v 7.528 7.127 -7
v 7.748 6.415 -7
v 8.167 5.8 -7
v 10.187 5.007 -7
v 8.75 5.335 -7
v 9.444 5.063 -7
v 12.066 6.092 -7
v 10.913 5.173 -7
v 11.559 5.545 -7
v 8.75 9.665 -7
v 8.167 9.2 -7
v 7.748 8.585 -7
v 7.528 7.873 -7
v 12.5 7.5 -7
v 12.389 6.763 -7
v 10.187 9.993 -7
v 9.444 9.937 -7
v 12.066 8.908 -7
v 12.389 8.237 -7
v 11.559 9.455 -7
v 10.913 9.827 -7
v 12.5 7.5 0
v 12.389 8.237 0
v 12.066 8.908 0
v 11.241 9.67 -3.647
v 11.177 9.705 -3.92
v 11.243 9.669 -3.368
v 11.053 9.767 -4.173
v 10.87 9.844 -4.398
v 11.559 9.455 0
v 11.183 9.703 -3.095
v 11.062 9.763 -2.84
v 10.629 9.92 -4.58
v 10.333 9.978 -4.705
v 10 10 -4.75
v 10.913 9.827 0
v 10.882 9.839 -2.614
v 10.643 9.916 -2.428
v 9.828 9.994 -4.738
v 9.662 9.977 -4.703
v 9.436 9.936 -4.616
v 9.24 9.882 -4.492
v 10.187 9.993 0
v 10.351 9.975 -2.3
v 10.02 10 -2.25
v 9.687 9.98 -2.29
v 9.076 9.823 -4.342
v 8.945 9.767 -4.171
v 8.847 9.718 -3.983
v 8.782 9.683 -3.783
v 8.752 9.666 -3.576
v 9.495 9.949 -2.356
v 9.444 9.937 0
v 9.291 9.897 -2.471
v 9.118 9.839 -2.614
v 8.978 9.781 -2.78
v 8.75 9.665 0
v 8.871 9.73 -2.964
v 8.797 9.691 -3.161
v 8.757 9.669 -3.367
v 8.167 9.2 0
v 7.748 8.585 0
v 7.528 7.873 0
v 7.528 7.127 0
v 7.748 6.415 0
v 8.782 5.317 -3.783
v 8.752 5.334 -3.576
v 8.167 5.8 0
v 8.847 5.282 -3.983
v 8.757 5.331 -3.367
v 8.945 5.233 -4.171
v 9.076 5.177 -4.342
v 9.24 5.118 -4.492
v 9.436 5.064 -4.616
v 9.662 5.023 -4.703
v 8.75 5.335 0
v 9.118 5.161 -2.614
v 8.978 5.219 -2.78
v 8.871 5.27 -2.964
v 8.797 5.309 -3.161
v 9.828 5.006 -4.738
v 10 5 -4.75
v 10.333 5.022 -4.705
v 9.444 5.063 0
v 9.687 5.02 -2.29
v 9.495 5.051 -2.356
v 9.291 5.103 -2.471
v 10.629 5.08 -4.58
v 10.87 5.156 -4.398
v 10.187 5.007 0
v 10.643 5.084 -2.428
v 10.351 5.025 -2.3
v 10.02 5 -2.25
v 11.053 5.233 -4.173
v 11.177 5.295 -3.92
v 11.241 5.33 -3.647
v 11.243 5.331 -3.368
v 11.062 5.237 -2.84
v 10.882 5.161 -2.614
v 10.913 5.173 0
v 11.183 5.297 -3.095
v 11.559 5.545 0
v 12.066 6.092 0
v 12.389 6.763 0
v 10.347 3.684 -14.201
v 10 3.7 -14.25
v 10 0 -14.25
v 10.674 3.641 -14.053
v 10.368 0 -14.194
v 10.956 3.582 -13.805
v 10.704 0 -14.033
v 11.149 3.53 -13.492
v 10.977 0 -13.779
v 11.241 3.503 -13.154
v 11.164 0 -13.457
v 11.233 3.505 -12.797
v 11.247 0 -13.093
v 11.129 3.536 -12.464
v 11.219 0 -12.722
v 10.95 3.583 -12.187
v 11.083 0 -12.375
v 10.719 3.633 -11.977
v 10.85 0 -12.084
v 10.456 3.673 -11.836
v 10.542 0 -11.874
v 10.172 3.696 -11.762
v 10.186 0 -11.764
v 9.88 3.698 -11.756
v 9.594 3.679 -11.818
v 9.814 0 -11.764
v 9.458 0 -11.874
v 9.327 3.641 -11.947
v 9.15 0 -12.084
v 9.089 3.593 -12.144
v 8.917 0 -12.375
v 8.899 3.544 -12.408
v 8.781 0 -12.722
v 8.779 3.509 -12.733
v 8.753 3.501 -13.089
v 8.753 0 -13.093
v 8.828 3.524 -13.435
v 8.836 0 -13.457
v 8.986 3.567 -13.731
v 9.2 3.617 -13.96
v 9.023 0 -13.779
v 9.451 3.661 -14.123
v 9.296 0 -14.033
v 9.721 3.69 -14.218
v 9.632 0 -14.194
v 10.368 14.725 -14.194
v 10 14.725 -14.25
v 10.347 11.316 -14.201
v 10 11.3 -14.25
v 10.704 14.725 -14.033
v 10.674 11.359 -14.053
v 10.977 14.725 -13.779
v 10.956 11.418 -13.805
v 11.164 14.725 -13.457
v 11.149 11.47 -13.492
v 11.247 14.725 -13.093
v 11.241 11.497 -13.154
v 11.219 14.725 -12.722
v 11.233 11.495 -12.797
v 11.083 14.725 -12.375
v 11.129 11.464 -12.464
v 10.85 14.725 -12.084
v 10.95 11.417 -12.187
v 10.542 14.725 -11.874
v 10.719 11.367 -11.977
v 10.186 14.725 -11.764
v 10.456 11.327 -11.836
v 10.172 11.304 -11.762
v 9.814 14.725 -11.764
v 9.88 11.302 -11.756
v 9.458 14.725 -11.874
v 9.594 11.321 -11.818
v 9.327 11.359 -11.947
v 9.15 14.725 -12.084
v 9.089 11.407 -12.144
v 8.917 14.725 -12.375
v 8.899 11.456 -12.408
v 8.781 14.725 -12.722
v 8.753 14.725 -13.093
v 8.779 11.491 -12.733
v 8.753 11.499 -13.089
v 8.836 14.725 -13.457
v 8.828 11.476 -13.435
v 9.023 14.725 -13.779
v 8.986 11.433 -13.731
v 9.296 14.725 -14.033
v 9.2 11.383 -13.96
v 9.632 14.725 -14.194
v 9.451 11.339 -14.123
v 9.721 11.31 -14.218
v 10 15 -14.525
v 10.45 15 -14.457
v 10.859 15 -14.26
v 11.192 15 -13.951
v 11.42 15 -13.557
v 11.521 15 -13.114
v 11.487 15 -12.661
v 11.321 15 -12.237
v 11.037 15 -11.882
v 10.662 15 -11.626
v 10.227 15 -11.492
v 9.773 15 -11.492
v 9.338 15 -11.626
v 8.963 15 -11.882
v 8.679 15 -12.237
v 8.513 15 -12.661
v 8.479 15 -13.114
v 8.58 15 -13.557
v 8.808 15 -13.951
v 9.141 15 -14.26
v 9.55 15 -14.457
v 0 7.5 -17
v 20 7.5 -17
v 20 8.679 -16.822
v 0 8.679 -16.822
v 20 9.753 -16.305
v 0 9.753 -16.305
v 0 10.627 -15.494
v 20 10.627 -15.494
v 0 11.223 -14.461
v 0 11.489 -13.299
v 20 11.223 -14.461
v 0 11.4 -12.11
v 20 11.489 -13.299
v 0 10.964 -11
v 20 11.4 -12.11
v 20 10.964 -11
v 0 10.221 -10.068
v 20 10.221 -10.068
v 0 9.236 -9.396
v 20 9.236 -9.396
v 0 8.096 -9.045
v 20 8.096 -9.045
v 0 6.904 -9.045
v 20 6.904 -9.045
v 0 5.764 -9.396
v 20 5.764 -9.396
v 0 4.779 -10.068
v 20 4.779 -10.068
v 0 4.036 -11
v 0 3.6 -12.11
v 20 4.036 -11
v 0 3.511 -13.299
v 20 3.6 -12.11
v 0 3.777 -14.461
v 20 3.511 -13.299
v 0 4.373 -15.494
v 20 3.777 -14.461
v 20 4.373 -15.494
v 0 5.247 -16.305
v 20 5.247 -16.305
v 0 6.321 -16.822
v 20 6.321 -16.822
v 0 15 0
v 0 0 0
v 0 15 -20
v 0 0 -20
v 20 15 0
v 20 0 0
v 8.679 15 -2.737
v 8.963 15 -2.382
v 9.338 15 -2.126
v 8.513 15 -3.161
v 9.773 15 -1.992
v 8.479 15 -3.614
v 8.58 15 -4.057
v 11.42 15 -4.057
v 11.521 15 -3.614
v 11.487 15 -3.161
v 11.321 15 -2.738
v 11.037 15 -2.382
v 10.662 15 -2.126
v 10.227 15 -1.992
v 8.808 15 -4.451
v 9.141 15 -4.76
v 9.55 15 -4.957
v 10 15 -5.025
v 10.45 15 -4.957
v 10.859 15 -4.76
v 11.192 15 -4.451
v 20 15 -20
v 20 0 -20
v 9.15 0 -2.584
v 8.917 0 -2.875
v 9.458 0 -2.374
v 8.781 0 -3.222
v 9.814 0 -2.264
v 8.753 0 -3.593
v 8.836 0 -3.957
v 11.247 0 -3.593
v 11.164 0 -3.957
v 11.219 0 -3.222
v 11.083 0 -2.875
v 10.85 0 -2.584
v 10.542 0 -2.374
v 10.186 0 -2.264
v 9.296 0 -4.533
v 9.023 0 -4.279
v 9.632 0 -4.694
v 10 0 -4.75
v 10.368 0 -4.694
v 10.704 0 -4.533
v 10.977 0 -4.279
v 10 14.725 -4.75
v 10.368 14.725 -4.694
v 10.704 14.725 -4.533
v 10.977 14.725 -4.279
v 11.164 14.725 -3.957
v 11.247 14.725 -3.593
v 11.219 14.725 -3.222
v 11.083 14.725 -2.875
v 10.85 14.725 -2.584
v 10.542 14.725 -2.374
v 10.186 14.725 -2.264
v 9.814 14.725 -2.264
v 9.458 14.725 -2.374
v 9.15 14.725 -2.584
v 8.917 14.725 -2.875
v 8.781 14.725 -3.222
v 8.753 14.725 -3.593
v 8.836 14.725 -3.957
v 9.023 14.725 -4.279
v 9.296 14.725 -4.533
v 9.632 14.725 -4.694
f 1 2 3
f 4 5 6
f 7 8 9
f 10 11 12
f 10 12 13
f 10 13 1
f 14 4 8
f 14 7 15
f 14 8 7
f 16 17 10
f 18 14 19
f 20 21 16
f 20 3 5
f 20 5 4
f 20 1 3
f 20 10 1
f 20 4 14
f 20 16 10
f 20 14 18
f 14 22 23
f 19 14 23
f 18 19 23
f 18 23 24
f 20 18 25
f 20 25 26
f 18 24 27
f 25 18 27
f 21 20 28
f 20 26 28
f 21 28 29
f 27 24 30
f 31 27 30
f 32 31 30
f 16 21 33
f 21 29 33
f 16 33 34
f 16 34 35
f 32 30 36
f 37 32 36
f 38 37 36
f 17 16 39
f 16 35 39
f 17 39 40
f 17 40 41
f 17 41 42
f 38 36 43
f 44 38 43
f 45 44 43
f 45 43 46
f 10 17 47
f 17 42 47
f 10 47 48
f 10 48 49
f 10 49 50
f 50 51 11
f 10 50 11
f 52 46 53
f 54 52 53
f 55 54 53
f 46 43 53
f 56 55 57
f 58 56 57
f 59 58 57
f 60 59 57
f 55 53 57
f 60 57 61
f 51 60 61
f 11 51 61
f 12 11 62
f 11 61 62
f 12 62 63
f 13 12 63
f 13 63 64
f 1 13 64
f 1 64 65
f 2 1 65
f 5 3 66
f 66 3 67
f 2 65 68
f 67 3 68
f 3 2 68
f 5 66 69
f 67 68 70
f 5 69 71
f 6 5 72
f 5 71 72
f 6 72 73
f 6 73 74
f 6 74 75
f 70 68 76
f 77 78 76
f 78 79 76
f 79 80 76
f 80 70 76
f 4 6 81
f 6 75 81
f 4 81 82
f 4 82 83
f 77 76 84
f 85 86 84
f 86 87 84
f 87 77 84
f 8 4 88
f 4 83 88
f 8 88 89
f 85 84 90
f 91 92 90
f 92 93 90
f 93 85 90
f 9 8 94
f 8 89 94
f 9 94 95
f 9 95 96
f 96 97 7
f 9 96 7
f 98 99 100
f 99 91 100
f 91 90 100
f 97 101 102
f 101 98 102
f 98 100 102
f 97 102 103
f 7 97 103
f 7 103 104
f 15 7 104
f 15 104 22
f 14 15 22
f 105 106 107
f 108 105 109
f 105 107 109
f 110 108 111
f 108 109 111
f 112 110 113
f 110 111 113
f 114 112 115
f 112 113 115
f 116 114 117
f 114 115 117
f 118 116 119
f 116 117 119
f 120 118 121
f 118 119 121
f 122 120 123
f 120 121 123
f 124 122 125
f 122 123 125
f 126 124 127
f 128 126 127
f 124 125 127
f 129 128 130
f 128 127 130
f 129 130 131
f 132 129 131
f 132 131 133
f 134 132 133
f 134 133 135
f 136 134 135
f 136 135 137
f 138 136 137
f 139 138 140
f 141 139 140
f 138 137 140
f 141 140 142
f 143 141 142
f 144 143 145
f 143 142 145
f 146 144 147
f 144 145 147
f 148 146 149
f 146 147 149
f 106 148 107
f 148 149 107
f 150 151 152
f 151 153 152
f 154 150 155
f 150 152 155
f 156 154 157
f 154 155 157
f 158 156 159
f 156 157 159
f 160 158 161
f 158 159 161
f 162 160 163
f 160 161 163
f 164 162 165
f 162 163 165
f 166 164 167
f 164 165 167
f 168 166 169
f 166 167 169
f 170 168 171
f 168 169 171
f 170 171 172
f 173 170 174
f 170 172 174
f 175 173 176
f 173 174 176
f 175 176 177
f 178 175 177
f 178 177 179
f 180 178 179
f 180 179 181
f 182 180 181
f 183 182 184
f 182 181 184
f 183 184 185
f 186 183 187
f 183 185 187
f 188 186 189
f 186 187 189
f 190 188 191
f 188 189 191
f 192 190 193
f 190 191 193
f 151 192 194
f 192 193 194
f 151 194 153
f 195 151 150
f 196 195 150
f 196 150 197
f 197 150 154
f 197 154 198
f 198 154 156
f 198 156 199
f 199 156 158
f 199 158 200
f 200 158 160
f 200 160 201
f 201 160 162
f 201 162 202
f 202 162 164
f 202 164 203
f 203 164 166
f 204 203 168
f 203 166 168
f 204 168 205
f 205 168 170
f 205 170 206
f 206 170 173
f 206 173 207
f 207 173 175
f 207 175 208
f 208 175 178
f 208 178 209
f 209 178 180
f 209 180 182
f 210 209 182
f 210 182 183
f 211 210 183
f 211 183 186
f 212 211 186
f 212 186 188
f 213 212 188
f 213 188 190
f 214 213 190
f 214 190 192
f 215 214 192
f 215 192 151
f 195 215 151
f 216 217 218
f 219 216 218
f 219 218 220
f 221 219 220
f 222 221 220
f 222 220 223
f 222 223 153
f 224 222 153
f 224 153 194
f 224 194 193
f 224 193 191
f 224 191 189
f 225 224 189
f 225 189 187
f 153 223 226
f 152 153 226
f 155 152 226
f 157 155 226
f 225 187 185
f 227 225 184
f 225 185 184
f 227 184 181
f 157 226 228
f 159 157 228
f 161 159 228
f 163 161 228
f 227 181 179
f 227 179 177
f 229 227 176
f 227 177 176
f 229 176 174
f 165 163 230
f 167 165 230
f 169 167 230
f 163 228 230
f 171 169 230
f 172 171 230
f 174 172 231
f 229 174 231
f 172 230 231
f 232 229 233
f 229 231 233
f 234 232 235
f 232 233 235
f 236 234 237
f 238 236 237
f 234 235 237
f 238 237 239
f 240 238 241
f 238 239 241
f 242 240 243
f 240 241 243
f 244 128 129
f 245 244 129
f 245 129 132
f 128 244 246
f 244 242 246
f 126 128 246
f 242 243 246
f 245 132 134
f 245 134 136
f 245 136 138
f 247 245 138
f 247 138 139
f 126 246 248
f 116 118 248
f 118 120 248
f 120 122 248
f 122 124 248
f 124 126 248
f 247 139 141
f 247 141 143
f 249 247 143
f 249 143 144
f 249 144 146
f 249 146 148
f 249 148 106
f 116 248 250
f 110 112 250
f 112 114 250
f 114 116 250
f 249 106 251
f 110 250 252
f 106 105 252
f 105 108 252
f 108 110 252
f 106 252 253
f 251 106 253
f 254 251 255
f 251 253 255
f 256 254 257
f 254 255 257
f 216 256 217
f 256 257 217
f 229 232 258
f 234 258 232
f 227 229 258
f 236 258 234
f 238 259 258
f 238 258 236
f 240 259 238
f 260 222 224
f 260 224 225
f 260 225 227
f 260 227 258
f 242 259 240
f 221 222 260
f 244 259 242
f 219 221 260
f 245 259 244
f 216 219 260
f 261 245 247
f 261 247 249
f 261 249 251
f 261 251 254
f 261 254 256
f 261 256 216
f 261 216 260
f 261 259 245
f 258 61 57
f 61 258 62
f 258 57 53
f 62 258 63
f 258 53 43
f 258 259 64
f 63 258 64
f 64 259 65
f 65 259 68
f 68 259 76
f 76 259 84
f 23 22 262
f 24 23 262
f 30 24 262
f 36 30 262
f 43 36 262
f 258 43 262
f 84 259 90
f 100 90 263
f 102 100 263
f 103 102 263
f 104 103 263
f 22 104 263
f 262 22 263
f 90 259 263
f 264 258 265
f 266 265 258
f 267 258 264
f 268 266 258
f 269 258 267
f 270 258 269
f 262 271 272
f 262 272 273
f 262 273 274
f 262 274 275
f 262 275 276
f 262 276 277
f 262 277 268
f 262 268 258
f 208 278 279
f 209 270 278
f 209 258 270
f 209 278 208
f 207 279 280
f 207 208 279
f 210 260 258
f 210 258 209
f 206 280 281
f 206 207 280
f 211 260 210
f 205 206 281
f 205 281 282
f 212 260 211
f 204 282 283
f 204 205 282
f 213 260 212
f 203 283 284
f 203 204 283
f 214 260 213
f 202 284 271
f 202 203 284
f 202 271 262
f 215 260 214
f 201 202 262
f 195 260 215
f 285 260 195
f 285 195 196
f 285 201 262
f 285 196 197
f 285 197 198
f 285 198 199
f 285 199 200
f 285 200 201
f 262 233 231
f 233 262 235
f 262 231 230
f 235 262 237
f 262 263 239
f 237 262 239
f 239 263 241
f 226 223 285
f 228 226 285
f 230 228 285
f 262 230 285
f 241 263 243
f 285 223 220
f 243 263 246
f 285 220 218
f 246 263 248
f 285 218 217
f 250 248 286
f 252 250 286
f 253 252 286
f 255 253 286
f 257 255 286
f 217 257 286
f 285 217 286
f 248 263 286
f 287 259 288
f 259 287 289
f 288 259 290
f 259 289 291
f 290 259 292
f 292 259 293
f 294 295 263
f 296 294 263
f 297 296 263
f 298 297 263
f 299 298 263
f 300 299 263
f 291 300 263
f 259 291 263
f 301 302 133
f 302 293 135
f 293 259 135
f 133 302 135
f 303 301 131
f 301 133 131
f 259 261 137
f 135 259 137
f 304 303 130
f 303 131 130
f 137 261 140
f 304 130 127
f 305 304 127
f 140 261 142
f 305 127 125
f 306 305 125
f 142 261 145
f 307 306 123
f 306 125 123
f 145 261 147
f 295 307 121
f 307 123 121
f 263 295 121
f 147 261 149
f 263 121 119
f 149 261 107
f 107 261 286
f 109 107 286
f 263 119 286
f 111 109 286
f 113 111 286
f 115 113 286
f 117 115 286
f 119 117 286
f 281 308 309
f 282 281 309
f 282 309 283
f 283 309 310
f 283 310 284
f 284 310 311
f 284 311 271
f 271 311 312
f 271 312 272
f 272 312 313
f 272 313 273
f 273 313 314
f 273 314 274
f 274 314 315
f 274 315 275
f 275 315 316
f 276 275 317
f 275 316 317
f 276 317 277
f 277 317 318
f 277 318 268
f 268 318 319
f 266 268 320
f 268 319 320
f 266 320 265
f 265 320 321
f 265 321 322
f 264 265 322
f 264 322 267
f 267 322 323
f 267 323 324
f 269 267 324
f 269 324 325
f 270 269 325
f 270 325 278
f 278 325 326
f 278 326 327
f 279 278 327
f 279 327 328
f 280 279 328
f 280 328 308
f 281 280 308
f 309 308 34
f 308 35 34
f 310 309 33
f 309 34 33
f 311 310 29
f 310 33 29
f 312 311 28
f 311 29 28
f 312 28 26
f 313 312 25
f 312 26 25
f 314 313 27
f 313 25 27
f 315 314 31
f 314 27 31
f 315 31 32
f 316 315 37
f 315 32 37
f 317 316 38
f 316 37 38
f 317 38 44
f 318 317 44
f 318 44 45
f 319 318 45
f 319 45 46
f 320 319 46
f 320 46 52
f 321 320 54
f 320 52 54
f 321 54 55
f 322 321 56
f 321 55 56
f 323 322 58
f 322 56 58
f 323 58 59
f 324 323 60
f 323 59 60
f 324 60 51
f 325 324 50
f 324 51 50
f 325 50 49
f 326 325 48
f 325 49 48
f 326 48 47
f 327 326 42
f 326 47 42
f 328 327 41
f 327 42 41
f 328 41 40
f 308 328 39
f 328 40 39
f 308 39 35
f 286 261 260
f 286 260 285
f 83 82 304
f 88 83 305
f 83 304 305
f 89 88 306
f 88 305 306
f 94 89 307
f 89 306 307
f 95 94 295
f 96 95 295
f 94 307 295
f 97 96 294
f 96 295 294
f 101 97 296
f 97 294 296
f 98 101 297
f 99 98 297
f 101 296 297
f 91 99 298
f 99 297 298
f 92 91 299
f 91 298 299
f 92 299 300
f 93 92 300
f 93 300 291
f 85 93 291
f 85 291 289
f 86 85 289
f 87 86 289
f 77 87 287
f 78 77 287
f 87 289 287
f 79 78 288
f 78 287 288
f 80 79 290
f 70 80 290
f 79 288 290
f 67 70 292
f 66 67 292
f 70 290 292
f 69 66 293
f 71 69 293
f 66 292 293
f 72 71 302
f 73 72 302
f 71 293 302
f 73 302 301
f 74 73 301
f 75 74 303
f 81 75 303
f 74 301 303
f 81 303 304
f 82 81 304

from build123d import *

# Parameters (mm, degrees)
SKIZZE1_W                          = 20
SKIZZE1_H                          = 20
AUFSATZ_LINEAR_AUSTRAGEN1_DEPTH    = 15
SKIZZE2_R                          = 2.5
SCHNITT_LINEAR_AUSTRAGEN1_DEPTH    = 7
SKIZZE4_R                          = 4
SCHNITT_LINEAR_AUSTRAGEN7_DEPTH    = 33.015621187
M3X0_5_GEWINDEBOHRUNG1_D           = 2.5
M3X0_5_GEWINDEBOHRUNG1_CSINK_D     = 3.05
M3X0_5_GEWINDEBOHRUNG1_CSINK_ANGLE = 90


with BuildPart() as part:
    # Skizze1 → Aufsatz-Linear austragen1 (new body)
    with BuildSketch(Plane(origin=(0, 0, 0), x_dir=(1, 0, 0), z_dir=(0, 1, 0))):
        with Locations((10, 10)):
            Rectangle(SKIZZE1_W, SKIZZE1_H)
    extrude(amount=AUFSATZ_LINEAR_AUSTRAGEN1_DEPTH)

    # Skizze2 → Schnitt-Linear austragen1 (cut)
    with BuildSketch(Plane.XY):
        with Locations((10, 7.5)):
            Circle(SKIZZE2_R)
    extrude(amount=-SCHNITT_LINEAR_AUSTRAGEN1_DEPTH, mode=Mode.SUBTRACT)

    # Skizze4 → Schnitt-Linear austragen7 (cut, through all)
    with BuildSketch(Plane(origin=(20, 0, 0), x_dir=(0, 0, -1), z_dir=(1, 0, 0))):
        with Locations((13, 7.5)):
            Circle(SKIZZE4_R)
    extrude(amount=-SCHNITT_LINEAR_AUSTRAGEN7_DEPTH, mode=Mode.SUBTRACT)

    # M3x0.5 Gewindebohrung1 (through all)
    with Locations(Plane(origin=(12, 15, 0), x_dir=(0, 0, 1), z_dir=(0, 1, 0))):
        with Locations((-3.5, -2), (-13, -2)):
            CounterSinkHole(M3X0_5_GEWINDEBOHRUNG1_D / 2, M3X0_5_GEWINDEBOHRUNG1_CSINK_D / 2, counter_sink_angle=M3X0_5_GEWINDEBOHRUNG1_CSINK_ANGLE)


solid = part.part
